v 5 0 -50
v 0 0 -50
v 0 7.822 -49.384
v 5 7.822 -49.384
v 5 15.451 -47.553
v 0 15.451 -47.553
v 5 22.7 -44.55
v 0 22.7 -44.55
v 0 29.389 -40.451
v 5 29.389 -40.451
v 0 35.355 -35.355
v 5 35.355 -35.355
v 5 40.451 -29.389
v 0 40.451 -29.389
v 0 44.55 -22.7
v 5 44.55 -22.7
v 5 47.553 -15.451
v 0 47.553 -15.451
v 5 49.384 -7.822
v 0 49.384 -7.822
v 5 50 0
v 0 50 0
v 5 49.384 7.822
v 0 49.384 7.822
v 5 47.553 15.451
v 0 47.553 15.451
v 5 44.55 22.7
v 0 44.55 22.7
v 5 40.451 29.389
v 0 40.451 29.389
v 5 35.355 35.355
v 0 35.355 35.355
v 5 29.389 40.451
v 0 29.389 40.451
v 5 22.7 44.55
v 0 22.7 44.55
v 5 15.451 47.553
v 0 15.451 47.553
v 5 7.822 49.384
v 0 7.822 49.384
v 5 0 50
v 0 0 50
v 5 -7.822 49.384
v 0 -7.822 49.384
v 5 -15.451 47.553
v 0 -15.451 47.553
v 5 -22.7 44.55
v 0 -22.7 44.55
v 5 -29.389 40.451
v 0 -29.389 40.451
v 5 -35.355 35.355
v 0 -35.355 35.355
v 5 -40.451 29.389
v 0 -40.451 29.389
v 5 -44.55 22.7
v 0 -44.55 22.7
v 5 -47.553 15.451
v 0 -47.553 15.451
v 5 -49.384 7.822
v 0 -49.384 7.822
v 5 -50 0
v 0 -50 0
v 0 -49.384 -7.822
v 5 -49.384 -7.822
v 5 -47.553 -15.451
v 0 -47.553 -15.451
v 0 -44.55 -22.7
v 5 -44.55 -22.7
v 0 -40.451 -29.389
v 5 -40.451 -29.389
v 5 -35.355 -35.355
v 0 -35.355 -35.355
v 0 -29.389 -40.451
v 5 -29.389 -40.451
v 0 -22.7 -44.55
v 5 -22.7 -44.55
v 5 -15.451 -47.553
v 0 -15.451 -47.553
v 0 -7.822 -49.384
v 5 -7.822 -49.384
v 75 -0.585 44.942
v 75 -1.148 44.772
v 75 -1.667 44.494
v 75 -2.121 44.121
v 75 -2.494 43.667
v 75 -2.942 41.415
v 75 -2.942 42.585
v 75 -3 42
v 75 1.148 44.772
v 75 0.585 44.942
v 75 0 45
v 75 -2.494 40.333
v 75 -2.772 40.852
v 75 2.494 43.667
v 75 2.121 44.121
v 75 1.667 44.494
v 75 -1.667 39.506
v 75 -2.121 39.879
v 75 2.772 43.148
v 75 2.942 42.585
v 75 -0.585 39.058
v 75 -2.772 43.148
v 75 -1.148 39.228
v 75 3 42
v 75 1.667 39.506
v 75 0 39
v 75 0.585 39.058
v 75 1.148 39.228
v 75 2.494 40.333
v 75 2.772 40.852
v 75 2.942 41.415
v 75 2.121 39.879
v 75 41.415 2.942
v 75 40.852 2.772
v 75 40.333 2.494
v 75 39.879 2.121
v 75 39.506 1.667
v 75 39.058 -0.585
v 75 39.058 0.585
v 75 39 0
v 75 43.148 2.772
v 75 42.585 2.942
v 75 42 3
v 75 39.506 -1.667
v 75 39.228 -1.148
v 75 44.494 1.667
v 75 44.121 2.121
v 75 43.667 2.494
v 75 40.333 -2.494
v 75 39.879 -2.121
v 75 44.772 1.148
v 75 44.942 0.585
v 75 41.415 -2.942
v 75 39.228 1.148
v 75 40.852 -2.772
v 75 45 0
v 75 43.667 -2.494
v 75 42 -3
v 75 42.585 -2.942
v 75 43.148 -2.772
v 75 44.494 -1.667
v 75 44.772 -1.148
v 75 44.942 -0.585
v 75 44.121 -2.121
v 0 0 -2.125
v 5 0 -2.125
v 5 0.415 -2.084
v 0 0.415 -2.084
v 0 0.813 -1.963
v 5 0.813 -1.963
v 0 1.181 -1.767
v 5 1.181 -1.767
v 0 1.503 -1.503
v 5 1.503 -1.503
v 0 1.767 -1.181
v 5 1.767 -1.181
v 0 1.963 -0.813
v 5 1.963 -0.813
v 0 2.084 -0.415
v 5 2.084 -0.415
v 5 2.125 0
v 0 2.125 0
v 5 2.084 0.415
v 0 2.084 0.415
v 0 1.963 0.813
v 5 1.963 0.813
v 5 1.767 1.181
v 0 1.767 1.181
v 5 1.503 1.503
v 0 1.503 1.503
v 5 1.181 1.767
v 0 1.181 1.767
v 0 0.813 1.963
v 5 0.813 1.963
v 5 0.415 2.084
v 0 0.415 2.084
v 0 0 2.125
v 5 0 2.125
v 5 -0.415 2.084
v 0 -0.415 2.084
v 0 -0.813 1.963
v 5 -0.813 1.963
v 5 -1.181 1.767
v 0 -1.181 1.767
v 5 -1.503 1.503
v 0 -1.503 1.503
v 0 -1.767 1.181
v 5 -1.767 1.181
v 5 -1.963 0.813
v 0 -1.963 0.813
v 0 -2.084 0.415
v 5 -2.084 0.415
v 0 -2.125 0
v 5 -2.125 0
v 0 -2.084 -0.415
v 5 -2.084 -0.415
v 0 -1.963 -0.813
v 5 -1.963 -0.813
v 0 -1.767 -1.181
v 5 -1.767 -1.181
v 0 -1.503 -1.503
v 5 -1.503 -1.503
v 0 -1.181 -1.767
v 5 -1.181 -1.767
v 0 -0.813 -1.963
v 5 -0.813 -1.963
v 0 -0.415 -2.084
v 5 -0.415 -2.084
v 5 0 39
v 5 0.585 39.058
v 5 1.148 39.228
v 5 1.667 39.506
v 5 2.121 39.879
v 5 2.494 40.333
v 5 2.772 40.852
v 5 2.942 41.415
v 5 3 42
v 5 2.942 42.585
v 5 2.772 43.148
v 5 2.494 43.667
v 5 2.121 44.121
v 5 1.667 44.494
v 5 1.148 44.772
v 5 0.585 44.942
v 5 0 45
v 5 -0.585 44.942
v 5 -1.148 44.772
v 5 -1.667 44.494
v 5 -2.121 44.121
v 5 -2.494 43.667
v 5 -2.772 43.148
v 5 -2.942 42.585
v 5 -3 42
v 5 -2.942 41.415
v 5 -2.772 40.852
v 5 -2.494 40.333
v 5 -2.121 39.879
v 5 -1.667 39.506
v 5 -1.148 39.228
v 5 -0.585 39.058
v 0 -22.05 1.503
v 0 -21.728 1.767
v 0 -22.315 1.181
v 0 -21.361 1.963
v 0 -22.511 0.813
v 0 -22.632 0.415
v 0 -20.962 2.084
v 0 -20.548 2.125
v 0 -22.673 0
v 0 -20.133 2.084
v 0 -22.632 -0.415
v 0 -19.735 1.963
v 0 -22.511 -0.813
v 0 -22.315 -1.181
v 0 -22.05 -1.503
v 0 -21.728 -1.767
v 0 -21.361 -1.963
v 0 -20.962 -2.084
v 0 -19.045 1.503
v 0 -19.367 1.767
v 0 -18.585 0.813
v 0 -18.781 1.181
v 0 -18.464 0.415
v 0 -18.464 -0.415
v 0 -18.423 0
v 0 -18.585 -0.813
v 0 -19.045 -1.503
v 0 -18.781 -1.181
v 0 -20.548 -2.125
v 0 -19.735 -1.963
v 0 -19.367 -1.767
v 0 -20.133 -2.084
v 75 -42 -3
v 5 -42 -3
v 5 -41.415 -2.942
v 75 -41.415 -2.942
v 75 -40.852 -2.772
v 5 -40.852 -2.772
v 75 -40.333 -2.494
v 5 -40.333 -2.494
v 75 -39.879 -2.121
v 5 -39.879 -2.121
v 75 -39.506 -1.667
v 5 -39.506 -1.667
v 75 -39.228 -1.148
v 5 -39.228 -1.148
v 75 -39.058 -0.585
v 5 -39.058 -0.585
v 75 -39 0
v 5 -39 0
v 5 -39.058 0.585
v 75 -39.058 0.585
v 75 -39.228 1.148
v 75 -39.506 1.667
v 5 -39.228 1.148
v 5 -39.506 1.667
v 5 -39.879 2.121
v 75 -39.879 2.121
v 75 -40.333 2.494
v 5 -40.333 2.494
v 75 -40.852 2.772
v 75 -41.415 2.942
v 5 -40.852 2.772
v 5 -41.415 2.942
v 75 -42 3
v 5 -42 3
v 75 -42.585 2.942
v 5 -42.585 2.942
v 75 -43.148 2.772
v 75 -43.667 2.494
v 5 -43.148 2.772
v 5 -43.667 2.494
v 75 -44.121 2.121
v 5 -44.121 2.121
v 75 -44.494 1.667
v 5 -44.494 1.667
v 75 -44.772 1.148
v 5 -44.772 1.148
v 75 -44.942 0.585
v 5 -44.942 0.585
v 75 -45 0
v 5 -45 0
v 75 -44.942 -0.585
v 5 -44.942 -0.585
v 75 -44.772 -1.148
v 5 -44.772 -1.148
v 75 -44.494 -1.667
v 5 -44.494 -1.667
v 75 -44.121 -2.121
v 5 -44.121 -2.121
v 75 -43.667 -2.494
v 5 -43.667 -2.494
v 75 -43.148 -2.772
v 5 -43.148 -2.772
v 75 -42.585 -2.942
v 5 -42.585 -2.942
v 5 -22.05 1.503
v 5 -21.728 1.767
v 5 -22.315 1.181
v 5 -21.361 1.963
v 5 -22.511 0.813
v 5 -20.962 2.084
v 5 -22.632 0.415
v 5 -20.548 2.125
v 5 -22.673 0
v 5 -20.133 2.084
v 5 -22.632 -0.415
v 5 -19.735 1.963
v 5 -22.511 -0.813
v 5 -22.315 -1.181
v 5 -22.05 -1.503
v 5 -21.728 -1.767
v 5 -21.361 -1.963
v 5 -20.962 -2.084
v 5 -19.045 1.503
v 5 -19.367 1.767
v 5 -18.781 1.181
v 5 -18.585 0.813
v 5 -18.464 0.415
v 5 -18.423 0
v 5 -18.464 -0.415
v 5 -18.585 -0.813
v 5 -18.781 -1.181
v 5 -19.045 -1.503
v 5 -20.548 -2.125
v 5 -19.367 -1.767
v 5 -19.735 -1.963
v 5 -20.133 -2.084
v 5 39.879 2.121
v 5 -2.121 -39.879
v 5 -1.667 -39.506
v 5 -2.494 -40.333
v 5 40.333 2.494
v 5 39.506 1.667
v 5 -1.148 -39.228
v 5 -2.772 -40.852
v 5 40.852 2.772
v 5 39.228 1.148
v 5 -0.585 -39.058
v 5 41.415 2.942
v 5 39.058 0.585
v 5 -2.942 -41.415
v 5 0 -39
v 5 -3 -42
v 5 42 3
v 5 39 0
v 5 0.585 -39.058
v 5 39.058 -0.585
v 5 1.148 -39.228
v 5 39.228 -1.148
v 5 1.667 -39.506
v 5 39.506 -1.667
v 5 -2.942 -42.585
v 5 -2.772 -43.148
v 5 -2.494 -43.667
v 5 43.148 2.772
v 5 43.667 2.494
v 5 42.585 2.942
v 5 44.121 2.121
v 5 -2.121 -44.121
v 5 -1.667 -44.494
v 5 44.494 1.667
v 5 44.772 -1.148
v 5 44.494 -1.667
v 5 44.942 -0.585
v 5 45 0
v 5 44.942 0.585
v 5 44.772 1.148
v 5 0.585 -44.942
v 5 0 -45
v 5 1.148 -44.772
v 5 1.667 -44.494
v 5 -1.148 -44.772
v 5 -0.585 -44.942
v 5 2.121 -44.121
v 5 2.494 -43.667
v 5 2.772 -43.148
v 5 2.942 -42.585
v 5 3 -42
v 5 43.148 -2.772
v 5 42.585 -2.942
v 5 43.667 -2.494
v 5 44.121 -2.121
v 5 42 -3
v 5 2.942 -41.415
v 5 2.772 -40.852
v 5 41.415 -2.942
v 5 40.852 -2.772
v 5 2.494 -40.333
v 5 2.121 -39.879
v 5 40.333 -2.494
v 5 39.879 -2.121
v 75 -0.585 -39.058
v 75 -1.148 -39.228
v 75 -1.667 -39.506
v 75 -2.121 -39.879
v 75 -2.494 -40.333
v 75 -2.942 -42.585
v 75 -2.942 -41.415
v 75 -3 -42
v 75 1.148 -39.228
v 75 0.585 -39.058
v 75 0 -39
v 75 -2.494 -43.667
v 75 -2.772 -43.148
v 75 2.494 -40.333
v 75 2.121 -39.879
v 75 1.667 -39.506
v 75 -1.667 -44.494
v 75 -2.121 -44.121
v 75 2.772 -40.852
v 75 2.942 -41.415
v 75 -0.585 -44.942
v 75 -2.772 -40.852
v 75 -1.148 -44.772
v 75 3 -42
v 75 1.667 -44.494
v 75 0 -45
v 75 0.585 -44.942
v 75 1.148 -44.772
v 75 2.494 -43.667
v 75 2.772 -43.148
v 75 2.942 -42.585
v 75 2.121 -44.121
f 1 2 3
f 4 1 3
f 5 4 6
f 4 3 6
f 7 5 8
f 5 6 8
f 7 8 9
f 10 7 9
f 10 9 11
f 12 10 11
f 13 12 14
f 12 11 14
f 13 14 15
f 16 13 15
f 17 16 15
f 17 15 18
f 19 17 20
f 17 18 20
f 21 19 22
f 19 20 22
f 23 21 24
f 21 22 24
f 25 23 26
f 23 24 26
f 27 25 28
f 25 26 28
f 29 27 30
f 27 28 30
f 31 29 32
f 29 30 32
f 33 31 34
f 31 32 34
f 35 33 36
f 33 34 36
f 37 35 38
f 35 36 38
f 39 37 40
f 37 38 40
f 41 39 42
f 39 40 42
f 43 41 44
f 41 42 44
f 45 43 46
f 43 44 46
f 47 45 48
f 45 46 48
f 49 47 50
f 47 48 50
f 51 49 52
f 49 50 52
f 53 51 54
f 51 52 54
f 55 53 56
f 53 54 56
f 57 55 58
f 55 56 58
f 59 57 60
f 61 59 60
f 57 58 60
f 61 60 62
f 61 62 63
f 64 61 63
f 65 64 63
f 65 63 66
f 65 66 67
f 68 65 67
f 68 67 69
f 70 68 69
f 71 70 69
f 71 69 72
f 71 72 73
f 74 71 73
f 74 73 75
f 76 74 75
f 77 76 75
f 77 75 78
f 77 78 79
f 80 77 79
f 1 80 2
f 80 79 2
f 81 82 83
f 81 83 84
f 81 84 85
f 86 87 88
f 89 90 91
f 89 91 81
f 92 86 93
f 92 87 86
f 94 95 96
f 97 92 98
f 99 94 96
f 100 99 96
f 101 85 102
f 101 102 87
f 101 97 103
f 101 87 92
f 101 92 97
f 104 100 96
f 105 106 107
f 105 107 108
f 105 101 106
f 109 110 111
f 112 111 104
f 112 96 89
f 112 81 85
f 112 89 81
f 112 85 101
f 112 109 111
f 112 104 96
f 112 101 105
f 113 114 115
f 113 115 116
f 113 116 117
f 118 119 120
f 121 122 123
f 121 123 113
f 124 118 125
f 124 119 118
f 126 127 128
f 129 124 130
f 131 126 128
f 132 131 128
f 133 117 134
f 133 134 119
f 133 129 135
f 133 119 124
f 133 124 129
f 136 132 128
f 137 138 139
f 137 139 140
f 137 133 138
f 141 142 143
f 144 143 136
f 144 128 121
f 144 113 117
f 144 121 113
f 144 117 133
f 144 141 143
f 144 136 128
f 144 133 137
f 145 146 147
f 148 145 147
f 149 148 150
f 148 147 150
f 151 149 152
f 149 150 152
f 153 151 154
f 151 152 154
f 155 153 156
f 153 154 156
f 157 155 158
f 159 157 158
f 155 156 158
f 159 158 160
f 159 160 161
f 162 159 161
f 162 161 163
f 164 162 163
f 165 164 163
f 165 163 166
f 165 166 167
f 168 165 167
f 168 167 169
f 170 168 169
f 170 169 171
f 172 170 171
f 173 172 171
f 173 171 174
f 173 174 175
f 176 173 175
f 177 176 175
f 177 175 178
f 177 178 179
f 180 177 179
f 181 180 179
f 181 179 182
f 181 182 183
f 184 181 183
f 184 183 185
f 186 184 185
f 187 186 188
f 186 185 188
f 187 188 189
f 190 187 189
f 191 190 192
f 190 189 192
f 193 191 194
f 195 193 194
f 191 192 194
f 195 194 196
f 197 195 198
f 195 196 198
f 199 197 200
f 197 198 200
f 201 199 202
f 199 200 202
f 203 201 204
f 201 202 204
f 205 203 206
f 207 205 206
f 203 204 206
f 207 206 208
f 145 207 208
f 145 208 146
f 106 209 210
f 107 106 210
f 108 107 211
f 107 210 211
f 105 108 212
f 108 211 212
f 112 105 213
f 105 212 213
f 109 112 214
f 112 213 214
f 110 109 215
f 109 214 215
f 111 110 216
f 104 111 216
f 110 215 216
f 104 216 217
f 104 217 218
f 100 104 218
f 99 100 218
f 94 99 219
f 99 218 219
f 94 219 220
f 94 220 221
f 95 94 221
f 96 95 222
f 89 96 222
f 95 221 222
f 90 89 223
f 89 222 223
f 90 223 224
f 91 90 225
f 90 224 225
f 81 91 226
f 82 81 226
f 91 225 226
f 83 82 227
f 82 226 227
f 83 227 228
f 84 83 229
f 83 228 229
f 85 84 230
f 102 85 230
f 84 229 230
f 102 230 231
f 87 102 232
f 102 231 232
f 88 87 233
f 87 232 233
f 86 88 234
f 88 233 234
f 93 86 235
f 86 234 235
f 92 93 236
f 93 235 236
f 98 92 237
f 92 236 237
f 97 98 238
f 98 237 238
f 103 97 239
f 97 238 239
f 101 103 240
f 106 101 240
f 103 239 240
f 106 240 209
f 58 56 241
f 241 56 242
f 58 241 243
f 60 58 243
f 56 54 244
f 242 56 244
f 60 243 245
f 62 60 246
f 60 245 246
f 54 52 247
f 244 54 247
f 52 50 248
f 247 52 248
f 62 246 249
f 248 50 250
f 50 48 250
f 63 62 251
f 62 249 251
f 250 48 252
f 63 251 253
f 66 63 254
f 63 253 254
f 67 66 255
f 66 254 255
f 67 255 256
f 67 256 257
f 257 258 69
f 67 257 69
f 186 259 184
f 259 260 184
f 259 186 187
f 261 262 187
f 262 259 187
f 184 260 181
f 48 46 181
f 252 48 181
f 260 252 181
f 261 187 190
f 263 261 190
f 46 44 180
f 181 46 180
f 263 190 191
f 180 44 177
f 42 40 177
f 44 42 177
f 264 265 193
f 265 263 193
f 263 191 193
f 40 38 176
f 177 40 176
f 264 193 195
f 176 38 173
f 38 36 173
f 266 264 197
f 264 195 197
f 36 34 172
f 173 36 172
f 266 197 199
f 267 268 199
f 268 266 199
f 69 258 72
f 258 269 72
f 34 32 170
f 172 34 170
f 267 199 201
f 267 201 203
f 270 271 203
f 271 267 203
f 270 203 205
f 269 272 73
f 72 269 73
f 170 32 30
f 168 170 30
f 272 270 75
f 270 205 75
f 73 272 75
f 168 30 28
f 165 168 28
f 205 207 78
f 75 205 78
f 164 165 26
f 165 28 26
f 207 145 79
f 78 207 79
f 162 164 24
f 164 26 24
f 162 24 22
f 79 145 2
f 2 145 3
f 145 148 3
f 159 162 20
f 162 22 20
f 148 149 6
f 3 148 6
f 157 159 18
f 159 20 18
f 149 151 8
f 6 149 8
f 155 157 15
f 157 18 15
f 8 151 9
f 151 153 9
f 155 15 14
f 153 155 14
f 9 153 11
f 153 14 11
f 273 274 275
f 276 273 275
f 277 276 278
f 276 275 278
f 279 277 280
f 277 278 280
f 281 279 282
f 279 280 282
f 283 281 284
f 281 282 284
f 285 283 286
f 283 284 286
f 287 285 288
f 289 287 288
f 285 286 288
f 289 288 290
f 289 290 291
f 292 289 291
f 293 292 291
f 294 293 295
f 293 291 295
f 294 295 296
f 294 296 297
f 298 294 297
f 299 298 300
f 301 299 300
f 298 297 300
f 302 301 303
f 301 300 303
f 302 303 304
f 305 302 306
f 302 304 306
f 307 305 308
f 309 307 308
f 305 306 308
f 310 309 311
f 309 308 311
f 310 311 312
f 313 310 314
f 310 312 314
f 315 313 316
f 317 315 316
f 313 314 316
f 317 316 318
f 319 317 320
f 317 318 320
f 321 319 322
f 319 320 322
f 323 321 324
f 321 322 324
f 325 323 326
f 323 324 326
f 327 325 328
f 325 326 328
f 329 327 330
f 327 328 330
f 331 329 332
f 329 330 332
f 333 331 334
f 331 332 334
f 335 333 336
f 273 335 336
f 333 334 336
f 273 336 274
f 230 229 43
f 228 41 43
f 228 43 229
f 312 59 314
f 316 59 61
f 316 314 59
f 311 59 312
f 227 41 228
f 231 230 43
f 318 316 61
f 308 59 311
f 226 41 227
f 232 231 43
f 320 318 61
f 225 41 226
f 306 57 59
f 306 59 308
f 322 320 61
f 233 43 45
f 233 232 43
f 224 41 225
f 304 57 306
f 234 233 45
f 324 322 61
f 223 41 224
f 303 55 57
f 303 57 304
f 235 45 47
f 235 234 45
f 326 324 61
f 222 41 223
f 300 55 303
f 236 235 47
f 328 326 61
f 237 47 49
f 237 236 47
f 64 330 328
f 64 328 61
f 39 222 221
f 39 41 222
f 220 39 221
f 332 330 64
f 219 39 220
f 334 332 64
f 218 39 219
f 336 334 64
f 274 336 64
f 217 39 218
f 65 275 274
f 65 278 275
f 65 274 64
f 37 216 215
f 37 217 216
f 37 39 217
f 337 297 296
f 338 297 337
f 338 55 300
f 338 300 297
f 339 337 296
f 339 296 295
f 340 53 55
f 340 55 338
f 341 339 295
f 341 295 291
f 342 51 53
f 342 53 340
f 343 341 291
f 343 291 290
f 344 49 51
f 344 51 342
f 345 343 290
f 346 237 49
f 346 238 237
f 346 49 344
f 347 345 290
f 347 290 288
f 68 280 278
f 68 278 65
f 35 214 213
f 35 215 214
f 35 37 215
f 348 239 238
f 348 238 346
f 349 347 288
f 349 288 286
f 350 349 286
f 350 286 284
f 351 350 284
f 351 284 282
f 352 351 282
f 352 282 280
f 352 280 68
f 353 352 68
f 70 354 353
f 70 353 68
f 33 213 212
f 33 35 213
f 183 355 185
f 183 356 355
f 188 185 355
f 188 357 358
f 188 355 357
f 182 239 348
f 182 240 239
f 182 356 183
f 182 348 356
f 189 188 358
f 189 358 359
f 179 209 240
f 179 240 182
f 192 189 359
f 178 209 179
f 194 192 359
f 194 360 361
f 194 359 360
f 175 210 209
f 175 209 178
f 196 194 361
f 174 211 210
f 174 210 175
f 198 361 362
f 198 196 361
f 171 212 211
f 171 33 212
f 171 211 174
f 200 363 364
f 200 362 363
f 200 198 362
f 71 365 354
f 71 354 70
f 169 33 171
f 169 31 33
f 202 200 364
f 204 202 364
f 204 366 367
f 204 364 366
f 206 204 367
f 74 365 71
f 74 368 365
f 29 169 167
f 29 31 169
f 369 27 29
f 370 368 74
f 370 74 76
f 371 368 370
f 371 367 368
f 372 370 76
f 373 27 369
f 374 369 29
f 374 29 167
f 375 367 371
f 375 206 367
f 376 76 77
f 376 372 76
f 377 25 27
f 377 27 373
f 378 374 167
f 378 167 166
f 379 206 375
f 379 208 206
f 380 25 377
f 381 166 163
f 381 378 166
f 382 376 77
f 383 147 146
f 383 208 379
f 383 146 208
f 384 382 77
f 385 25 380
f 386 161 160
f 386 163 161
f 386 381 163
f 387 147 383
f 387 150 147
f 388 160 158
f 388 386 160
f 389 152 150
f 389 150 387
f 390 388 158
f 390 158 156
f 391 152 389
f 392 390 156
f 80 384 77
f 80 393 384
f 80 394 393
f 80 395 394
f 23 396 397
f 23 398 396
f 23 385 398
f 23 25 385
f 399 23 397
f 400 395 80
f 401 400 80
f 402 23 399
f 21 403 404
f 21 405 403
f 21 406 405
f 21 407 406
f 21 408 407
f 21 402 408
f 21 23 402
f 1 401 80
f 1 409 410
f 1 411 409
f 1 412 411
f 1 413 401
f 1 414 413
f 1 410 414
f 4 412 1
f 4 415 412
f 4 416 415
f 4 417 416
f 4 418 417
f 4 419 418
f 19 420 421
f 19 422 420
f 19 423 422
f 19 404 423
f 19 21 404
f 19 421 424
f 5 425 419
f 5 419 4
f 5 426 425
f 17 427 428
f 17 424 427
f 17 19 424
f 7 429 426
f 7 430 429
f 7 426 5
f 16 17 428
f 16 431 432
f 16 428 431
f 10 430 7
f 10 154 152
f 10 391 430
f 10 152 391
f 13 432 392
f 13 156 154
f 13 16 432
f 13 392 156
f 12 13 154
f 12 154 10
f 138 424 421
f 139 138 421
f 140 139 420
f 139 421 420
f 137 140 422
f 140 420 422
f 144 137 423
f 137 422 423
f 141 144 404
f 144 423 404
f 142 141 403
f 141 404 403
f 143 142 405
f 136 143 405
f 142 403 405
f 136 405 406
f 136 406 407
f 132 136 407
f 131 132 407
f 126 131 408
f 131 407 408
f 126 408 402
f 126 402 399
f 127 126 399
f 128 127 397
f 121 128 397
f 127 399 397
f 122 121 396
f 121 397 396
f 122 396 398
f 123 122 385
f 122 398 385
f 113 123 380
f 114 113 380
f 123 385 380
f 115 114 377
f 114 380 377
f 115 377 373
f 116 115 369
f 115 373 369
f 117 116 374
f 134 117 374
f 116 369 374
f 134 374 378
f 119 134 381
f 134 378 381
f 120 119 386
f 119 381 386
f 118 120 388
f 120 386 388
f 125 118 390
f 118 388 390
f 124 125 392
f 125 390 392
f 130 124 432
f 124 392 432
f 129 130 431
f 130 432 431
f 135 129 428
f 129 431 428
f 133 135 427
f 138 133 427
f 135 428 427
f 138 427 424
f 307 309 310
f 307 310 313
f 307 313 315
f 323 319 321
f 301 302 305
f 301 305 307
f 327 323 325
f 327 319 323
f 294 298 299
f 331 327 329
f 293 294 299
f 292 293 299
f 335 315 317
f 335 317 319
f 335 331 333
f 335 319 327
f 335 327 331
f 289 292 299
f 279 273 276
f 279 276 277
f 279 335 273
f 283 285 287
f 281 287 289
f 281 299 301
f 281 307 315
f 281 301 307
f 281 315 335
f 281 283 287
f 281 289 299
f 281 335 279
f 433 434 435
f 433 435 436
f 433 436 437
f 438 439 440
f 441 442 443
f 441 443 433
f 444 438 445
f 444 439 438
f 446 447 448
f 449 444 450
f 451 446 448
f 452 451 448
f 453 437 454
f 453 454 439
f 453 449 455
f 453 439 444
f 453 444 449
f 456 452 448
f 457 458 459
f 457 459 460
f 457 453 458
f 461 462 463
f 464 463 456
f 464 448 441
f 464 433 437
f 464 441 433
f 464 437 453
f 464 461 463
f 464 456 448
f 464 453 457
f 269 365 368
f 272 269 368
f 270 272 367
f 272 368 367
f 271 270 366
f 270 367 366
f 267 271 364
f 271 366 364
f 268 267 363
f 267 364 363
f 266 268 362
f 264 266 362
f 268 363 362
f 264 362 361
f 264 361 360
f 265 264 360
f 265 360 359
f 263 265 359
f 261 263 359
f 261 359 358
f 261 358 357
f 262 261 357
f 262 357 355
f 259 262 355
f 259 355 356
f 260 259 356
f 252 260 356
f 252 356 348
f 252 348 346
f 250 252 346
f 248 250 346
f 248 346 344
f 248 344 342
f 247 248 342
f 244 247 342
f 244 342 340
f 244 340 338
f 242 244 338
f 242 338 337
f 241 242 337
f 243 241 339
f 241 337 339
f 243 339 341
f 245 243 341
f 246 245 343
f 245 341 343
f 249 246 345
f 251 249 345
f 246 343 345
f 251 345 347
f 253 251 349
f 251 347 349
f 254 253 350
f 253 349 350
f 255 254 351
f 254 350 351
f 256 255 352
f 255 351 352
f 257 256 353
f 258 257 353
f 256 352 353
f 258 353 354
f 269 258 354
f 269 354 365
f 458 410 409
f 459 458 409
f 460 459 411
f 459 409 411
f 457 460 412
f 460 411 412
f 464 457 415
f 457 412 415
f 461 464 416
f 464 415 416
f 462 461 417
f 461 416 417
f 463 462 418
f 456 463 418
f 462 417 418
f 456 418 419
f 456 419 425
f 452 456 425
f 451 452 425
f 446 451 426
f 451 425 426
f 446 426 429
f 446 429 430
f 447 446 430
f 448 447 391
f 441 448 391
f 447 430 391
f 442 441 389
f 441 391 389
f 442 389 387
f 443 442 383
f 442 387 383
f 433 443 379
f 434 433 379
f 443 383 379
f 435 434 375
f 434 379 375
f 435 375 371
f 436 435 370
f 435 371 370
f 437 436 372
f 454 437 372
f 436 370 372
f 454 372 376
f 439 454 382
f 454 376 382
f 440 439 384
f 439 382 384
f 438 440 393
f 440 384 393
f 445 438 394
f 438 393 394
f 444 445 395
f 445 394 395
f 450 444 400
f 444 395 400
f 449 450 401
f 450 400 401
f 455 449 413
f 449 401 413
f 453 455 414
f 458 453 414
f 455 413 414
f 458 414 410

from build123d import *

# Parameters (mm, degrees)
ESQUISSE1_R             = 50
BOSS_EXTRU_1_DEPTH      = 5
ESQUISSE2_R             = 3
BOSS_EXTRU_3_DEPTH      = 70
ESQUISSE3_R             = 2.125
ENL_V_MAT_EXTRU_2_DEPTH = 70


with BuildPart() as part:
    # Esquisse1 → Boss.-Extru.1 (new body)
    with BuildSketch(Plane(origin=(0, 0, 0), x_dir=(0, 0, -1), z_dir=(1, 0, 0))):
        Circle(ESQUISSE1_R)
    extrude(amount=BOSS_EXTRU_1_DEPTH)

    # Esquisse2 → Boss.-Extru.3 (add)
    with BuildSketch(Plane(origin=(5, 0, 0), x_dir=(0, 0, -1), z_dir=(1, 0, 0))):
        with Locations((-42, 0)):
            Circle(ESQUISSE2_R)
        with Locations((42, 0)):
            Circle(ESQUISSE2_R)
        with Locations((0, -42)):
            Circle(ESQUISSE2_R)
        with Locations((0, 42)):
            Circle(ESQUISSE2_R)
    extrude(amount=BOSS_EXTRU_3_DEPTH)

    # Esquisse3 → Enlèv. mat.-Extru.2 (cut)
    with BuildSketch(Plane(origin=(5, 0, 0), x_dir=(0, 0, -1), z_dir=(1, 0, 0))):
        Circle(ESQUISSE3_R)
        with Locations((0, -20.547843558)):
            Circle(ESQUISSE3_R)
    extrude(amount=-ENL_V_MAT_EXTRU_2_DEPTH, mode=Mode.SUBTRACT)


solid = part.part
